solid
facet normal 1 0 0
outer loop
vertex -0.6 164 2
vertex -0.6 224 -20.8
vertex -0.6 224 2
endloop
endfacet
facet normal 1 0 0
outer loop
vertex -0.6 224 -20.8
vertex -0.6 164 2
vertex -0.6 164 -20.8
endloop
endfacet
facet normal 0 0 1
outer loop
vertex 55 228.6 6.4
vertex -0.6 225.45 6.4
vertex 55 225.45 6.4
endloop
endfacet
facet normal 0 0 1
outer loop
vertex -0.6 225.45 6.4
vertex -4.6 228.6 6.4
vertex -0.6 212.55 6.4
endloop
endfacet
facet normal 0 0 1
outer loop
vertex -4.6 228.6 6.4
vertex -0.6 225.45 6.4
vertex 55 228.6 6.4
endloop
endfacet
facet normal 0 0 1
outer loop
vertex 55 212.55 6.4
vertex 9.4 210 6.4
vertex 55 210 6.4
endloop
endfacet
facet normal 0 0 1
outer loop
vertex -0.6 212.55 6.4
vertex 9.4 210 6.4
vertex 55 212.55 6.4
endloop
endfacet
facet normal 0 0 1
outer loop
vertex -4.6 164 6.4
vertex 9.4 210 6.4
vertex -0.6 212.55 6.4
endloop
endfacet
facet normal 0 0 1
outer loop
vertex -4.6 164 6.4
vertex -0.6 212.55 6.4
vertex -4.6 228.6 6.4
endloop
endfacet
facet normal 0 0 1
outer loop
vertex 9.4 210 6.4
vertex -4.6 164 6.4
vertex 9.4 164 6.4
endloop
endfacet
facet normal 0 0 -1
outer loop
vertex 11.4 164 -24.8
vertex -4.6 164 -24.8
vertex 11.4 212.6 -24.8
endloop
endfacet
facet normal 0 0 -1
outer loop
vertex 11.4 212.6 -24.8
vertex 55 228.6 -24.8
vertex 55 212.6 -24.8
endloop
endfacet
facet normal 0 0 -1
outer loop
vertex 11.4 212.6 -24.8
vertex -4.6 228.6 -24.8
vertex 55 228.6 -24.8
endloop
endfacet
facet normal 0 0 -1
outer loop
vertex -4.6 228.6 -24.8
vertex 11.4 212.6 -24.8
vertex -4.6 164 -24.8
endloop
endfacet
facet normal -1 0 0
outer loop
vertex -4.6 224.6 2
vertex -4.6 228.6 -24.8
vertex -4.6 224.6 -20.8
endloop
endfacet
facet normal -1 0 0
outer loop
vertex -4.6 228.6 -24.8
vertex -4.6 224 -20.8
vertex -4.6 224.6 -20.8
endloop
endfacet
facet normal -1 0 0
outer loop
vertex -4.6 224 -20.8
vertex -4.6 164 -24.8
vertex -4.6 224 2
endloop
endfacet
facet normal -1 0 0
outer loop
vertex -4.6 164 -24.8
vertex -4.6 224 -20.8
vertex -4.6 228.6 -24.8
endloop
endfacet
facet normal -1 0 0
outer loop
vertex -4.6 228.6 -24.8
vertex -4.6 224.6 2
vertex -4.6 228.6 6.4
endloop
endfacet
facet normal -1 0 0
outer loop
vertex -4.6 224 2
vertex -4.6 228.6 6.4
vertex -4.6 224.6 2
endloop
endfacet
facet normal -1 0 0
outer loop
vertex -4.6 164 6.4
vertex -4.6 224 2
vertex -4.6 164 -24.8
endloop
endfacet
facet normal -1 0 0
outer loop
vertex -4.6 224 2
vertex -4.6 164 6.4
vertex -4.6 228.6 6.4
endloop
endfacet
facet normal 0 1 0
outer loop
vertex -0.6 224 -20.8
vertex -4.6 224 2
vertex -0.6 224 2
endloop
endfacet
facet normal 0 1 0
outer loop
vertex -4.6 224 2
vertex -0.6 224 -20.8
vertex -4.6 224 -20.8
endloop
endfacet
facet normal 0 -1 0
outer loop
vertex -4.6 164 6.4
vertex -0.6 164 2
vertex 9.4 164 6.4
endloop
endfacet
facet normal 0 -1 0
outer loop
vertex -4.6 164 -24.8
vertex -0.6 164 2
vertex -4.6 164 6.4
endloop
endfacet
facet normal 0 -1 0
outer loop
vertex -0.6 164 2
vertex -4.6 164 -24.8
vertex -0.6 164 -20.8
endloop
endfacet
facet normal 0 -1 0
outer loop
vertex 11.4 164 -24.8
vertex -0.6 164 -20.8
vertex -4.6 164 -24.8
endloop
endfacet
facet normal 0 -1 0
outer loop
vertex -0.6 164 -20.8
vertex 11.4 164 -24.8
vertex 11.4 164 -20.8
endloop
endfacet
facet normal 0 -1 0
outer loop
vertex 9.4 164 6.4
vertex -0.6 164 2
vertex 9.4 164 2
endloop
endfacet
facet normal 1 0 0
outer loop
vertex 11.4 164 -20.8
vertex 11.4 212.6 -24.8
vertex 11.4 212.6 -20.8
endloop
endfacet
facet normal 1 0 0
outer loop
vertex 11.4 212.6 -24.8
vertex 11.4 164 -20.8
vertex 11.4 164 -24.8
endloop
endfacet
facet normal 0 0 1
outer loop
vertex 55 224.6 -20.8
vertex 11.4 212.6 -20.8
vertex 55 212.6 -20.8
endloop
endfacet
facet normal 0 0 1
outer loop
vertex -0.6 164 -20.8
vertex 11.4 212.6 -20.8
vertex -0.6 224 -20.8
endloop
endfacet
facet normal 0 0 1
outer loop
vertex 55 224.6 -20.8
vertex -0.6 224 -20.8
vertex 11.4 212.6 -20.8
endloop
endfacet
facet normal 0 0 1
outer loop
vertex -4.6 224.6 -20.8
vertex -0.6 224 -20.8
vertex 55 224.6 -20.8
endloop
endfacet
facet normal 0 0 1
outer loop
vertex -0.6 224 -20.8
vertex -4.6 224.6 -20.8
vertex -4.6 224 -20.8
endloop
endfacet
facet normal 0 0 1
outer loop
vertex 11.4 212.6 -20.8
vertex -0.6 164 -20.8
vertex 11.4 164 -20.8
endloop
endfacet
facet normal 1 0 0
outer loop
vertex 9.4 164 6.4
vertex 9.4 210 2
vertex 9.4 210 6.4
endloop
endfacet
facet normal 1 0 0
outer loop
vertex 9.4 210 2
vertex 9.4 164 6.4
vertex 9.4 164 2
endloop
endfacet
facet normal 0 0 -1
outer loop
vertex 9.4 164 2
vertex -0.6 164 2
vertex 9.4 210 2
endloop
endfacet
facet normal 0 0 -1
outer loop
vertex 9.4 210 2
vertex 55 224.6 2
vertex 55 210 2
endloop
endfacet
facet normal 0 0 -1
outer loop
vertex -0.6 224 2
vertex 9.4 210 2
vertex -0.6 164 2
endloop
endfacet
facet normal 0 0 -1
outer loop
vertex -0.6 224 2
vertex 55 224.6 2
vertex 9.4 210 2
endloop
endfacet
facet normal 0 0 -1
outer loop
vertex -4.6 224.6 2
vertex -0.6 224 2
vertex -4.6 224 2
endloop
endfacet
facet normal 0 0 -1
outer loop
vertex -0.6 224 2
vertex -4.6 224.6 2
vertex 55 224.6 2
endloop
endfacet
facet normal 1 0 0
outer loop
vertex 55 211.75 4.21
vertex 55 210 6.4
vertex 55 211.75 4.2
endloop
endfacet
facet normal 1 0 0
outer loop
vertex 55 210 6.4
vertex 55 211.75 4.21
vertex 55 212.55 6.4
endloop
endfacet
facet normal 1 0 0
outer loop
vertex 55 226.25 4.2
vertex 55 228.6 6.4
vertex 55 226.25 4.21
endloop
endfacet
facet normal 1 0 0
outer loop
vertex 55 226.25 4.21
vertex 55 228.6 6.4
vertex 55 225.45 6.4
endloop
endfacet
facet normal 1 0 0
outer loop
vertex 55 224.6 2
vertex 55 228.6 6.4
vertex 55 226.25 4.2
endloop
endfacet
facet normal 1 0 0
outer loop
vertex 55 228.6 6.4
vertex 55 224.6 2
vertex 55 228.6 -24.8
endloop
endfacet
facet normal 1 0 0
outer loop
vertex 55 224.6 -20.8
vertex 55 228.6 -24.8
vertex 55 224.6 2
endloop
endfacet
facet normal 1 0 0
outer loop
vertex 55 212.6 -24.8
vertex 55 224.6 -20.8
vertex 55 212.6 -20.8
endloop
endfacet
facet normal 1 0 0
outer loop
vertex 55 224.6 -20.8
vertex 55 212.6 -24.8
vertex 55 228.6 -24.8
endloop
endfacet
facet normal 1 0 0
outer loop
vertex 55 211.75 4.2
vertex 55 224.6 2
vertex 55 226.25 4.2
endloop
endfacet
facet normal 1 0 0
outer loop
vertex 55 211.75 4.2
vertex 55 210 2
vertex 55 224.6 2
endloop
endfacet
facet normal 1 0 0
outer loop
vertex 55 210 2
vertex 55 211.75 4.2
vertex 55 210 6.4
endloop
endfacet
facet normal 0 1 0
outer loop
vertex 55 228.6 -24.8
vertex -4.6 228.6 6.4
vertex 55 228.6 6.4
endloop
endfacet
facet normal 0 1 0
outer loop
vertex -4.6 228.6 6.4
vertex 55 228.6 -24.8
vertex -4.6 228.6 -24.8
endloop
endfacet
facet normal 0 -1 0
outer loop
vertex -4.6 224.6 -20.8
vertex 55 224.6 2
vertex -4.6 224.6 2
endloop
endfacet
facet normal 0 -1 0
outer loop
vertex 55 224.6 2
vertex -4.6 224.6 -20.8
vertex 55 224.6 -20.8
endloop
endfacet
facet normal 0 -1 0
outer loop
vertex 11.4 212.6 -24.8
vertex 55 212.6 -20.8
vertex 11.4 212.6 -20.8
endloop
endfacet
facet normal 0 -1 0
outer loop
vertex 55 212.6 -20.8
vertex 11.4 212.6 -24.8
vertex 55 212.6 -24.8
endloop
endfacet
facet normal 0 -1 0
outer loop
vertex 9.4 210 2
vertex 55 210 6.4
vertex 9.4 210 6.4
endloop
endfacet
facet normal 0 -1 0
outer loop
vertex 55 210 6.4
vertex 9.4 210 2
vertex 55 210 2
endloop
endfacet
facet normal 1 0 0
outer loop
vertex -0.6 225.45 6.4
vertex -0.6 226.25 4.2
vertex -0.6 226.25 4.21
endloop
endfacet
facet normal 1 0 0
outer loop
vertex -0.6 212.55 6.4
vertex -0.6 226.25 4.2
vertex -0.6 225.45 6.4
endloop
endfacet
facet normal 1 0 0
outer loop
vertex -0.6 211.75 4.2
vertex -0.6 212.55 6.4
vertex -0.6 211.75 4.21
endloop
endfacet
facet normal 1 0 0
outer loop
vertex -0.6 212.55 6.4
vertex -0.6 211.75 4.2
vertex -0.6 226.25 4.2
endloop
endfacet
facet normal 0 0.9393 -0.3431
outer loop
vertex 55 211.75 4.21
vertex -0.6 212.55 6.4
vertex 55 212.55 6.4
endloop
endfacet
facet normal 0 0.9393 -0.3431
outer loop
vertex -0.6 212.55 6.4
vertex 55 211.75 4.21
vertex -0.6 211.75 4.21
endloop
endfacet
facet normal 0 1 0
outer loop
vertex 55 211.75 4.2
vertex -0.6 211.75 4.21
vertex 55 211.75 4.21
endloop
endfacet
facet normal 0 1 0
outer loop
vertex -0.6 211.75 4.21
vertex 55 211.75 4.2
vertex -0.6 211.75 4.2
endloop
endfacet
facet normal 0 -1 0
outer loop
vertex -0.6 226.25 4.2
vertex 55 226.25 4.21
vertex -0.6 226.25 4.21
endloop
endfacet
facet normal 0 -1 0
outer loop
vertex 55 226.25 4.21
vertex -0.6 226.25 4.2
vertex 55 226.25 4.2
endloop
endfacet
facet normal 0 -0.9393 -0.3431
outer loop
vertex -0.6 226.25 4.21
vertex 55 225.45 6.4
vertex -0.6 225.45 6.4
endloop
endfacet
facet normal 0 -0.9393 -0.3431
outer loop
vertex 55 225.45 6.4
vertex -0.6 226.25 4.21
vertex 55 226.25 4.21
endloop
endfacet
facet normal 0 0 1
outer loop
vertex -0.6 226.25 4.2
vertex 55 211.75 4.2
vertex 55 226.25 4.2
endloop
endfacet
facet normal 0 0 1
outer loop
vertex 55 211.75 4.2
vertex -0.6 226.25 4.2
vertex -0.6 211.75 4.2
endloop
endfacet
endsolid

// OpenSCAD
// ============================================
// OpenGrid Under-Desk Dell Pro 14 Plus (PB14250) Cradle v1
// 4 independent CORNER BRACKETS, slide-in from the FRONT.
//
// MECHANISM (different from the MBA drop-in cradle):
//   - Laptop is stored closed + horizontal under the desk.
//   - It SLIDES IN from the front (+Y) until its back edge
//     hits the two rear brackets' back walls.
//   - Each bracket captures a corner: outer side wall (X stop),
//     bottom shelf (holds weight), top flange (up stop).
//   - Rear pair adds a back wall (insertion limit + back-edge grab).
//   - Front pair adds a small chamfered detent on the shelf so a
//     bump/knee won't slide it out; firm pull to remove.
//
// MOUNTING: OpenGrid Multiconnect dovetail system (same spec as
// the MBA file). Each bracket's top flange has one dovetail
// channel; a snap (printed separately) clips into the grid and the
// bracket slides onto it.
//   slot (top, narrow)        = 12.9mm
//   wide (bottom, undercut)   = 14.5mm
//   depth                     = 2.2mm
//
// GRID ALIGNMENT (why channels run in X):
//   Laptop depth 224mm = exactly 8 grid cells (8 x 28) -> the
//   front and rear brackets land on real grid rows 8 cells apart.
//   Laptop width 313.5mm is NOT a grid multiple, so the channels
//   run along X: each bracket slides sideways to absorb the odd
//   width while staying clipped to the grid.
//
// Every bracket is small (<~70mm) so the P2S 256mm bed is a
// non-issue -- no long back rail, no splitting.
//
// Print snaps: makerworld.com/en/models/1179191
// Repo: github.com/johntondreau-png/opengrid-desk-mounts
// ============================================

/* [Laptop Dimensions] */
// Dell Pro 14 Plus PB14250 width (mm)
laptop_w = 313.5;
// depth (mm)
laptop_d = 224.0;
// max thickness (mm)
laptop_h = 20.2;

/* [Bracket Geometry] */
// Wall / shelf thickness (mm)
wall      = 4.0;
// Side-arm length along the side edge, per bracket (mm)
side_len  = 60;
// Rear back-arm length along the back edge, per bracket (mm)
back_len  = 55;
// How far the bottom shelf reaches under the laptop (mm)
shelf     = 12;
// How far the top flange overhangs the laptop top, side edge (mm)
top_grab  = 10;
// Clearance: laptop top -> flange underside (mm). Must exceed detent.
top_gap   = 2.0;
// Clearance: laptop side edge -> wall (mm)
side_gap  = 0.6;
// Clearance: laptop bottom -> shelf top (mm)
shelf_gap = 0.6;
// Front detent bump height (mm). Set 0 for a free slide. Keep < top_gap.
detent    = 1.2;

/* [OpenGrid] */
// Grid spacing center-to-center (mm)
grid = 28;
// Multiconnect dovetail channel (Thread Docs PDF)
ch_slot = 12.9;   // narrow slot at top surface (grid side)
ch_wide = 14.5;   // wider undercut below (locks snap)
ch_d    = 2.2;    // channel depth into part
// Flange thickness: ch_d below + 2.2mm solid = 4.4mm
flange_t = ch_d + 2.2;

/* [Part to Generate] */
part = "rear_left"; // [rear_left, rear_right, front_left, front_right, all]

/* [Hidden] */
eps = 0.01;

// Z levels (laptop top face at Z = 0)
z_flange_bot = top_gap;
z_flange_top = top_gap + flange_t;
z_shelf_top  = -laptop_h - shelf_gap;
z_shelf_bot  = z_shelf_top - wall;
wall_h       = z_flange_top - z_shelf_bot;

// Channel center offset inward from each edge so the dovetail
// stays on the flange (front & rear stay exactly laptop_d apart).
chan_inset = 5;
yc_rear    = laptop_d - chan_inset;
yc_front   = -chan_inset;

// Back-arm flange inward reach (must clear the channel width)
back_grab  = 14;
// Front channel ear footprint (Y), hosts the X-channel near front
ear_y0     = yc_front - ch_wide/2 - 2;
ear_y1     = 10;
// Detent shelf extends this far in front of the laptop edge
det_front  = 6;

// ============================================
// mc_dovetail_x(len)
// Female Multiconnect dovetail cutter running along +X.
// Call origin at the channel entry on the part's TOP face.
// At Z=0 (top, grid side):  slot width = ch_slot (narrow).
// At Z=-ch_d (deeper):       slot width = ch_wide (undercut).
// Leave solid material before X=0 for a stop wall.
// ============================================
module mc_dovetail_x(len) {
  hull() {
    translate([0, -ch_slot/2, -eps]) cube([len, ch_slot, eps]);
    translate([0, -ch_wide/2, -ch_d]) cube([len, ch_wide, eps]);
  }
}

// ============================================
// left_side_arm(y0, L)
// Captures the laptop LEFT edge (X=0; outside is X<0) over
// Y in [y0, y0+L]: outer side wall + bottom shelf + top flange.
// ============================================
module left_side_arm(y0, L) {
  // Outer side wall (X stop)
  translate([-side_gap - wall, y0, z_shelf_bot])
    cube([wall, L, wall_h]);
  // Bottom shelf (holds the laptop's weight)
  translate([-side_gap, y0, z_shelf_bot])
    cube([shelf, L, wall]);
  // Top flange overhang (Z up-stop, presses against grid)
  translate([-side_gap - wall, y0, z_flange_bot])
    cube([wall + top_grab, L, flange_t]);
}

// ============================================
// front_detent()
// Small chamfered bump on the front-bracket shelf. Ramp on the
// -Y side (cam in), near-vertical face toward the laptop so a
// nudge won't slide it out. Sits 1mm in front of the laptop edge.
// ============================================
module front_detent() {
  hull() {
    translate([-side_gap, -det_front, z_shelf_top]) cube([shelf, det_front - 1, eps]);
    translate([-side_gap, -1 - eps, z_shelf_top])   cube([shelf, eps, detent]);
  }
}

// ============================================
// corner_bracket(rear)
// Builds the LEFT bracket. rear=true -> rear corner (adds back
// wall + back-edge flange). rear=false -> front corner (adds
// channel ear + detent, open front for slide-in).
// Mirror about X=laptop_w/2 for the right-hand brackets.
// ============================================
module corner_bracket(rear) {
  yc = rear ? yc_rear : yc_front;
  cx_end = rear ? back_len : back_len;   // channel runs to this X
  difference() {
    union() {
      if (rear) {
        // Side capture over the rear region
        left_side_arm(laptop_d - side_len, side_len);
        // Back capture: outer back wall (Y stop / insertion limit)
        translate([-side_gap - wall, laptop_d + side_gap, z_shelf_bot])
          cube([back_len + side_gap + wall, wall, wall_h]);
        // Back shelf (grabs the rear edge from below)
        translate([-side_gap - wall, laptop_d + side_gap - shelf, z_shelf_bot])
          cube([back_len + side_gap + wall, shelf, wall]);
        // Back flange (hosts the X-channel)
        translate([-side_gap - wall, laptop_d - back_grab, z_flange_bot])
          cube([back_len + side_gap + wall, (laptop_d + side_gap + wall) - (laptop_d - back_grab), flange_t]);
      } else {
        // Side capture over the front region (shelf reaches forward
        // of the laptop edge to support the detent)
        left_side_arm(-det_front, side_len + det_front);
        // Front channel ear (hosts the X-channel near the front edge)
        translate([-side_gap - wall, ear_y0, z_flange_bot])
          cube([back_len + side_gap + wall, ear_y1 - ear_y0, flange_t]);
        // Retention detent
        front_detent();
      }
    }
    // Dovetail channel: starts after a wall-thick stop, open at the
    // inner (+X) flange edge. Runs along X (grid alignment).
    translate([-side_gap, yc, z_flange_top])
      mc_dovetail_x(cx_end + side_gap);
  }
}

// ============================================
// RENDER
// ============================================
module rear_left()   { corner_bracket(true);  }
module front_left()  { corner_bracket(false); }
module rear_right()  { translate([laptop_w, 0, 0]) mirror([1, 0, 0]) corner_bracket(true);  }
module front_right() { translate([laptop_w, 0, 0]) mirror([1, 0, 0]) corner_bracket(false); }

if (part == "rear_left")        rear_left();
else if (part == "rear_right")  rear_right();
else if (part == "front_left")  front_left();
else if (part == "front_right") front_right();
else if (part == "all") {
  rear_left();  rear_right();
  front_left(); front_right();
}
